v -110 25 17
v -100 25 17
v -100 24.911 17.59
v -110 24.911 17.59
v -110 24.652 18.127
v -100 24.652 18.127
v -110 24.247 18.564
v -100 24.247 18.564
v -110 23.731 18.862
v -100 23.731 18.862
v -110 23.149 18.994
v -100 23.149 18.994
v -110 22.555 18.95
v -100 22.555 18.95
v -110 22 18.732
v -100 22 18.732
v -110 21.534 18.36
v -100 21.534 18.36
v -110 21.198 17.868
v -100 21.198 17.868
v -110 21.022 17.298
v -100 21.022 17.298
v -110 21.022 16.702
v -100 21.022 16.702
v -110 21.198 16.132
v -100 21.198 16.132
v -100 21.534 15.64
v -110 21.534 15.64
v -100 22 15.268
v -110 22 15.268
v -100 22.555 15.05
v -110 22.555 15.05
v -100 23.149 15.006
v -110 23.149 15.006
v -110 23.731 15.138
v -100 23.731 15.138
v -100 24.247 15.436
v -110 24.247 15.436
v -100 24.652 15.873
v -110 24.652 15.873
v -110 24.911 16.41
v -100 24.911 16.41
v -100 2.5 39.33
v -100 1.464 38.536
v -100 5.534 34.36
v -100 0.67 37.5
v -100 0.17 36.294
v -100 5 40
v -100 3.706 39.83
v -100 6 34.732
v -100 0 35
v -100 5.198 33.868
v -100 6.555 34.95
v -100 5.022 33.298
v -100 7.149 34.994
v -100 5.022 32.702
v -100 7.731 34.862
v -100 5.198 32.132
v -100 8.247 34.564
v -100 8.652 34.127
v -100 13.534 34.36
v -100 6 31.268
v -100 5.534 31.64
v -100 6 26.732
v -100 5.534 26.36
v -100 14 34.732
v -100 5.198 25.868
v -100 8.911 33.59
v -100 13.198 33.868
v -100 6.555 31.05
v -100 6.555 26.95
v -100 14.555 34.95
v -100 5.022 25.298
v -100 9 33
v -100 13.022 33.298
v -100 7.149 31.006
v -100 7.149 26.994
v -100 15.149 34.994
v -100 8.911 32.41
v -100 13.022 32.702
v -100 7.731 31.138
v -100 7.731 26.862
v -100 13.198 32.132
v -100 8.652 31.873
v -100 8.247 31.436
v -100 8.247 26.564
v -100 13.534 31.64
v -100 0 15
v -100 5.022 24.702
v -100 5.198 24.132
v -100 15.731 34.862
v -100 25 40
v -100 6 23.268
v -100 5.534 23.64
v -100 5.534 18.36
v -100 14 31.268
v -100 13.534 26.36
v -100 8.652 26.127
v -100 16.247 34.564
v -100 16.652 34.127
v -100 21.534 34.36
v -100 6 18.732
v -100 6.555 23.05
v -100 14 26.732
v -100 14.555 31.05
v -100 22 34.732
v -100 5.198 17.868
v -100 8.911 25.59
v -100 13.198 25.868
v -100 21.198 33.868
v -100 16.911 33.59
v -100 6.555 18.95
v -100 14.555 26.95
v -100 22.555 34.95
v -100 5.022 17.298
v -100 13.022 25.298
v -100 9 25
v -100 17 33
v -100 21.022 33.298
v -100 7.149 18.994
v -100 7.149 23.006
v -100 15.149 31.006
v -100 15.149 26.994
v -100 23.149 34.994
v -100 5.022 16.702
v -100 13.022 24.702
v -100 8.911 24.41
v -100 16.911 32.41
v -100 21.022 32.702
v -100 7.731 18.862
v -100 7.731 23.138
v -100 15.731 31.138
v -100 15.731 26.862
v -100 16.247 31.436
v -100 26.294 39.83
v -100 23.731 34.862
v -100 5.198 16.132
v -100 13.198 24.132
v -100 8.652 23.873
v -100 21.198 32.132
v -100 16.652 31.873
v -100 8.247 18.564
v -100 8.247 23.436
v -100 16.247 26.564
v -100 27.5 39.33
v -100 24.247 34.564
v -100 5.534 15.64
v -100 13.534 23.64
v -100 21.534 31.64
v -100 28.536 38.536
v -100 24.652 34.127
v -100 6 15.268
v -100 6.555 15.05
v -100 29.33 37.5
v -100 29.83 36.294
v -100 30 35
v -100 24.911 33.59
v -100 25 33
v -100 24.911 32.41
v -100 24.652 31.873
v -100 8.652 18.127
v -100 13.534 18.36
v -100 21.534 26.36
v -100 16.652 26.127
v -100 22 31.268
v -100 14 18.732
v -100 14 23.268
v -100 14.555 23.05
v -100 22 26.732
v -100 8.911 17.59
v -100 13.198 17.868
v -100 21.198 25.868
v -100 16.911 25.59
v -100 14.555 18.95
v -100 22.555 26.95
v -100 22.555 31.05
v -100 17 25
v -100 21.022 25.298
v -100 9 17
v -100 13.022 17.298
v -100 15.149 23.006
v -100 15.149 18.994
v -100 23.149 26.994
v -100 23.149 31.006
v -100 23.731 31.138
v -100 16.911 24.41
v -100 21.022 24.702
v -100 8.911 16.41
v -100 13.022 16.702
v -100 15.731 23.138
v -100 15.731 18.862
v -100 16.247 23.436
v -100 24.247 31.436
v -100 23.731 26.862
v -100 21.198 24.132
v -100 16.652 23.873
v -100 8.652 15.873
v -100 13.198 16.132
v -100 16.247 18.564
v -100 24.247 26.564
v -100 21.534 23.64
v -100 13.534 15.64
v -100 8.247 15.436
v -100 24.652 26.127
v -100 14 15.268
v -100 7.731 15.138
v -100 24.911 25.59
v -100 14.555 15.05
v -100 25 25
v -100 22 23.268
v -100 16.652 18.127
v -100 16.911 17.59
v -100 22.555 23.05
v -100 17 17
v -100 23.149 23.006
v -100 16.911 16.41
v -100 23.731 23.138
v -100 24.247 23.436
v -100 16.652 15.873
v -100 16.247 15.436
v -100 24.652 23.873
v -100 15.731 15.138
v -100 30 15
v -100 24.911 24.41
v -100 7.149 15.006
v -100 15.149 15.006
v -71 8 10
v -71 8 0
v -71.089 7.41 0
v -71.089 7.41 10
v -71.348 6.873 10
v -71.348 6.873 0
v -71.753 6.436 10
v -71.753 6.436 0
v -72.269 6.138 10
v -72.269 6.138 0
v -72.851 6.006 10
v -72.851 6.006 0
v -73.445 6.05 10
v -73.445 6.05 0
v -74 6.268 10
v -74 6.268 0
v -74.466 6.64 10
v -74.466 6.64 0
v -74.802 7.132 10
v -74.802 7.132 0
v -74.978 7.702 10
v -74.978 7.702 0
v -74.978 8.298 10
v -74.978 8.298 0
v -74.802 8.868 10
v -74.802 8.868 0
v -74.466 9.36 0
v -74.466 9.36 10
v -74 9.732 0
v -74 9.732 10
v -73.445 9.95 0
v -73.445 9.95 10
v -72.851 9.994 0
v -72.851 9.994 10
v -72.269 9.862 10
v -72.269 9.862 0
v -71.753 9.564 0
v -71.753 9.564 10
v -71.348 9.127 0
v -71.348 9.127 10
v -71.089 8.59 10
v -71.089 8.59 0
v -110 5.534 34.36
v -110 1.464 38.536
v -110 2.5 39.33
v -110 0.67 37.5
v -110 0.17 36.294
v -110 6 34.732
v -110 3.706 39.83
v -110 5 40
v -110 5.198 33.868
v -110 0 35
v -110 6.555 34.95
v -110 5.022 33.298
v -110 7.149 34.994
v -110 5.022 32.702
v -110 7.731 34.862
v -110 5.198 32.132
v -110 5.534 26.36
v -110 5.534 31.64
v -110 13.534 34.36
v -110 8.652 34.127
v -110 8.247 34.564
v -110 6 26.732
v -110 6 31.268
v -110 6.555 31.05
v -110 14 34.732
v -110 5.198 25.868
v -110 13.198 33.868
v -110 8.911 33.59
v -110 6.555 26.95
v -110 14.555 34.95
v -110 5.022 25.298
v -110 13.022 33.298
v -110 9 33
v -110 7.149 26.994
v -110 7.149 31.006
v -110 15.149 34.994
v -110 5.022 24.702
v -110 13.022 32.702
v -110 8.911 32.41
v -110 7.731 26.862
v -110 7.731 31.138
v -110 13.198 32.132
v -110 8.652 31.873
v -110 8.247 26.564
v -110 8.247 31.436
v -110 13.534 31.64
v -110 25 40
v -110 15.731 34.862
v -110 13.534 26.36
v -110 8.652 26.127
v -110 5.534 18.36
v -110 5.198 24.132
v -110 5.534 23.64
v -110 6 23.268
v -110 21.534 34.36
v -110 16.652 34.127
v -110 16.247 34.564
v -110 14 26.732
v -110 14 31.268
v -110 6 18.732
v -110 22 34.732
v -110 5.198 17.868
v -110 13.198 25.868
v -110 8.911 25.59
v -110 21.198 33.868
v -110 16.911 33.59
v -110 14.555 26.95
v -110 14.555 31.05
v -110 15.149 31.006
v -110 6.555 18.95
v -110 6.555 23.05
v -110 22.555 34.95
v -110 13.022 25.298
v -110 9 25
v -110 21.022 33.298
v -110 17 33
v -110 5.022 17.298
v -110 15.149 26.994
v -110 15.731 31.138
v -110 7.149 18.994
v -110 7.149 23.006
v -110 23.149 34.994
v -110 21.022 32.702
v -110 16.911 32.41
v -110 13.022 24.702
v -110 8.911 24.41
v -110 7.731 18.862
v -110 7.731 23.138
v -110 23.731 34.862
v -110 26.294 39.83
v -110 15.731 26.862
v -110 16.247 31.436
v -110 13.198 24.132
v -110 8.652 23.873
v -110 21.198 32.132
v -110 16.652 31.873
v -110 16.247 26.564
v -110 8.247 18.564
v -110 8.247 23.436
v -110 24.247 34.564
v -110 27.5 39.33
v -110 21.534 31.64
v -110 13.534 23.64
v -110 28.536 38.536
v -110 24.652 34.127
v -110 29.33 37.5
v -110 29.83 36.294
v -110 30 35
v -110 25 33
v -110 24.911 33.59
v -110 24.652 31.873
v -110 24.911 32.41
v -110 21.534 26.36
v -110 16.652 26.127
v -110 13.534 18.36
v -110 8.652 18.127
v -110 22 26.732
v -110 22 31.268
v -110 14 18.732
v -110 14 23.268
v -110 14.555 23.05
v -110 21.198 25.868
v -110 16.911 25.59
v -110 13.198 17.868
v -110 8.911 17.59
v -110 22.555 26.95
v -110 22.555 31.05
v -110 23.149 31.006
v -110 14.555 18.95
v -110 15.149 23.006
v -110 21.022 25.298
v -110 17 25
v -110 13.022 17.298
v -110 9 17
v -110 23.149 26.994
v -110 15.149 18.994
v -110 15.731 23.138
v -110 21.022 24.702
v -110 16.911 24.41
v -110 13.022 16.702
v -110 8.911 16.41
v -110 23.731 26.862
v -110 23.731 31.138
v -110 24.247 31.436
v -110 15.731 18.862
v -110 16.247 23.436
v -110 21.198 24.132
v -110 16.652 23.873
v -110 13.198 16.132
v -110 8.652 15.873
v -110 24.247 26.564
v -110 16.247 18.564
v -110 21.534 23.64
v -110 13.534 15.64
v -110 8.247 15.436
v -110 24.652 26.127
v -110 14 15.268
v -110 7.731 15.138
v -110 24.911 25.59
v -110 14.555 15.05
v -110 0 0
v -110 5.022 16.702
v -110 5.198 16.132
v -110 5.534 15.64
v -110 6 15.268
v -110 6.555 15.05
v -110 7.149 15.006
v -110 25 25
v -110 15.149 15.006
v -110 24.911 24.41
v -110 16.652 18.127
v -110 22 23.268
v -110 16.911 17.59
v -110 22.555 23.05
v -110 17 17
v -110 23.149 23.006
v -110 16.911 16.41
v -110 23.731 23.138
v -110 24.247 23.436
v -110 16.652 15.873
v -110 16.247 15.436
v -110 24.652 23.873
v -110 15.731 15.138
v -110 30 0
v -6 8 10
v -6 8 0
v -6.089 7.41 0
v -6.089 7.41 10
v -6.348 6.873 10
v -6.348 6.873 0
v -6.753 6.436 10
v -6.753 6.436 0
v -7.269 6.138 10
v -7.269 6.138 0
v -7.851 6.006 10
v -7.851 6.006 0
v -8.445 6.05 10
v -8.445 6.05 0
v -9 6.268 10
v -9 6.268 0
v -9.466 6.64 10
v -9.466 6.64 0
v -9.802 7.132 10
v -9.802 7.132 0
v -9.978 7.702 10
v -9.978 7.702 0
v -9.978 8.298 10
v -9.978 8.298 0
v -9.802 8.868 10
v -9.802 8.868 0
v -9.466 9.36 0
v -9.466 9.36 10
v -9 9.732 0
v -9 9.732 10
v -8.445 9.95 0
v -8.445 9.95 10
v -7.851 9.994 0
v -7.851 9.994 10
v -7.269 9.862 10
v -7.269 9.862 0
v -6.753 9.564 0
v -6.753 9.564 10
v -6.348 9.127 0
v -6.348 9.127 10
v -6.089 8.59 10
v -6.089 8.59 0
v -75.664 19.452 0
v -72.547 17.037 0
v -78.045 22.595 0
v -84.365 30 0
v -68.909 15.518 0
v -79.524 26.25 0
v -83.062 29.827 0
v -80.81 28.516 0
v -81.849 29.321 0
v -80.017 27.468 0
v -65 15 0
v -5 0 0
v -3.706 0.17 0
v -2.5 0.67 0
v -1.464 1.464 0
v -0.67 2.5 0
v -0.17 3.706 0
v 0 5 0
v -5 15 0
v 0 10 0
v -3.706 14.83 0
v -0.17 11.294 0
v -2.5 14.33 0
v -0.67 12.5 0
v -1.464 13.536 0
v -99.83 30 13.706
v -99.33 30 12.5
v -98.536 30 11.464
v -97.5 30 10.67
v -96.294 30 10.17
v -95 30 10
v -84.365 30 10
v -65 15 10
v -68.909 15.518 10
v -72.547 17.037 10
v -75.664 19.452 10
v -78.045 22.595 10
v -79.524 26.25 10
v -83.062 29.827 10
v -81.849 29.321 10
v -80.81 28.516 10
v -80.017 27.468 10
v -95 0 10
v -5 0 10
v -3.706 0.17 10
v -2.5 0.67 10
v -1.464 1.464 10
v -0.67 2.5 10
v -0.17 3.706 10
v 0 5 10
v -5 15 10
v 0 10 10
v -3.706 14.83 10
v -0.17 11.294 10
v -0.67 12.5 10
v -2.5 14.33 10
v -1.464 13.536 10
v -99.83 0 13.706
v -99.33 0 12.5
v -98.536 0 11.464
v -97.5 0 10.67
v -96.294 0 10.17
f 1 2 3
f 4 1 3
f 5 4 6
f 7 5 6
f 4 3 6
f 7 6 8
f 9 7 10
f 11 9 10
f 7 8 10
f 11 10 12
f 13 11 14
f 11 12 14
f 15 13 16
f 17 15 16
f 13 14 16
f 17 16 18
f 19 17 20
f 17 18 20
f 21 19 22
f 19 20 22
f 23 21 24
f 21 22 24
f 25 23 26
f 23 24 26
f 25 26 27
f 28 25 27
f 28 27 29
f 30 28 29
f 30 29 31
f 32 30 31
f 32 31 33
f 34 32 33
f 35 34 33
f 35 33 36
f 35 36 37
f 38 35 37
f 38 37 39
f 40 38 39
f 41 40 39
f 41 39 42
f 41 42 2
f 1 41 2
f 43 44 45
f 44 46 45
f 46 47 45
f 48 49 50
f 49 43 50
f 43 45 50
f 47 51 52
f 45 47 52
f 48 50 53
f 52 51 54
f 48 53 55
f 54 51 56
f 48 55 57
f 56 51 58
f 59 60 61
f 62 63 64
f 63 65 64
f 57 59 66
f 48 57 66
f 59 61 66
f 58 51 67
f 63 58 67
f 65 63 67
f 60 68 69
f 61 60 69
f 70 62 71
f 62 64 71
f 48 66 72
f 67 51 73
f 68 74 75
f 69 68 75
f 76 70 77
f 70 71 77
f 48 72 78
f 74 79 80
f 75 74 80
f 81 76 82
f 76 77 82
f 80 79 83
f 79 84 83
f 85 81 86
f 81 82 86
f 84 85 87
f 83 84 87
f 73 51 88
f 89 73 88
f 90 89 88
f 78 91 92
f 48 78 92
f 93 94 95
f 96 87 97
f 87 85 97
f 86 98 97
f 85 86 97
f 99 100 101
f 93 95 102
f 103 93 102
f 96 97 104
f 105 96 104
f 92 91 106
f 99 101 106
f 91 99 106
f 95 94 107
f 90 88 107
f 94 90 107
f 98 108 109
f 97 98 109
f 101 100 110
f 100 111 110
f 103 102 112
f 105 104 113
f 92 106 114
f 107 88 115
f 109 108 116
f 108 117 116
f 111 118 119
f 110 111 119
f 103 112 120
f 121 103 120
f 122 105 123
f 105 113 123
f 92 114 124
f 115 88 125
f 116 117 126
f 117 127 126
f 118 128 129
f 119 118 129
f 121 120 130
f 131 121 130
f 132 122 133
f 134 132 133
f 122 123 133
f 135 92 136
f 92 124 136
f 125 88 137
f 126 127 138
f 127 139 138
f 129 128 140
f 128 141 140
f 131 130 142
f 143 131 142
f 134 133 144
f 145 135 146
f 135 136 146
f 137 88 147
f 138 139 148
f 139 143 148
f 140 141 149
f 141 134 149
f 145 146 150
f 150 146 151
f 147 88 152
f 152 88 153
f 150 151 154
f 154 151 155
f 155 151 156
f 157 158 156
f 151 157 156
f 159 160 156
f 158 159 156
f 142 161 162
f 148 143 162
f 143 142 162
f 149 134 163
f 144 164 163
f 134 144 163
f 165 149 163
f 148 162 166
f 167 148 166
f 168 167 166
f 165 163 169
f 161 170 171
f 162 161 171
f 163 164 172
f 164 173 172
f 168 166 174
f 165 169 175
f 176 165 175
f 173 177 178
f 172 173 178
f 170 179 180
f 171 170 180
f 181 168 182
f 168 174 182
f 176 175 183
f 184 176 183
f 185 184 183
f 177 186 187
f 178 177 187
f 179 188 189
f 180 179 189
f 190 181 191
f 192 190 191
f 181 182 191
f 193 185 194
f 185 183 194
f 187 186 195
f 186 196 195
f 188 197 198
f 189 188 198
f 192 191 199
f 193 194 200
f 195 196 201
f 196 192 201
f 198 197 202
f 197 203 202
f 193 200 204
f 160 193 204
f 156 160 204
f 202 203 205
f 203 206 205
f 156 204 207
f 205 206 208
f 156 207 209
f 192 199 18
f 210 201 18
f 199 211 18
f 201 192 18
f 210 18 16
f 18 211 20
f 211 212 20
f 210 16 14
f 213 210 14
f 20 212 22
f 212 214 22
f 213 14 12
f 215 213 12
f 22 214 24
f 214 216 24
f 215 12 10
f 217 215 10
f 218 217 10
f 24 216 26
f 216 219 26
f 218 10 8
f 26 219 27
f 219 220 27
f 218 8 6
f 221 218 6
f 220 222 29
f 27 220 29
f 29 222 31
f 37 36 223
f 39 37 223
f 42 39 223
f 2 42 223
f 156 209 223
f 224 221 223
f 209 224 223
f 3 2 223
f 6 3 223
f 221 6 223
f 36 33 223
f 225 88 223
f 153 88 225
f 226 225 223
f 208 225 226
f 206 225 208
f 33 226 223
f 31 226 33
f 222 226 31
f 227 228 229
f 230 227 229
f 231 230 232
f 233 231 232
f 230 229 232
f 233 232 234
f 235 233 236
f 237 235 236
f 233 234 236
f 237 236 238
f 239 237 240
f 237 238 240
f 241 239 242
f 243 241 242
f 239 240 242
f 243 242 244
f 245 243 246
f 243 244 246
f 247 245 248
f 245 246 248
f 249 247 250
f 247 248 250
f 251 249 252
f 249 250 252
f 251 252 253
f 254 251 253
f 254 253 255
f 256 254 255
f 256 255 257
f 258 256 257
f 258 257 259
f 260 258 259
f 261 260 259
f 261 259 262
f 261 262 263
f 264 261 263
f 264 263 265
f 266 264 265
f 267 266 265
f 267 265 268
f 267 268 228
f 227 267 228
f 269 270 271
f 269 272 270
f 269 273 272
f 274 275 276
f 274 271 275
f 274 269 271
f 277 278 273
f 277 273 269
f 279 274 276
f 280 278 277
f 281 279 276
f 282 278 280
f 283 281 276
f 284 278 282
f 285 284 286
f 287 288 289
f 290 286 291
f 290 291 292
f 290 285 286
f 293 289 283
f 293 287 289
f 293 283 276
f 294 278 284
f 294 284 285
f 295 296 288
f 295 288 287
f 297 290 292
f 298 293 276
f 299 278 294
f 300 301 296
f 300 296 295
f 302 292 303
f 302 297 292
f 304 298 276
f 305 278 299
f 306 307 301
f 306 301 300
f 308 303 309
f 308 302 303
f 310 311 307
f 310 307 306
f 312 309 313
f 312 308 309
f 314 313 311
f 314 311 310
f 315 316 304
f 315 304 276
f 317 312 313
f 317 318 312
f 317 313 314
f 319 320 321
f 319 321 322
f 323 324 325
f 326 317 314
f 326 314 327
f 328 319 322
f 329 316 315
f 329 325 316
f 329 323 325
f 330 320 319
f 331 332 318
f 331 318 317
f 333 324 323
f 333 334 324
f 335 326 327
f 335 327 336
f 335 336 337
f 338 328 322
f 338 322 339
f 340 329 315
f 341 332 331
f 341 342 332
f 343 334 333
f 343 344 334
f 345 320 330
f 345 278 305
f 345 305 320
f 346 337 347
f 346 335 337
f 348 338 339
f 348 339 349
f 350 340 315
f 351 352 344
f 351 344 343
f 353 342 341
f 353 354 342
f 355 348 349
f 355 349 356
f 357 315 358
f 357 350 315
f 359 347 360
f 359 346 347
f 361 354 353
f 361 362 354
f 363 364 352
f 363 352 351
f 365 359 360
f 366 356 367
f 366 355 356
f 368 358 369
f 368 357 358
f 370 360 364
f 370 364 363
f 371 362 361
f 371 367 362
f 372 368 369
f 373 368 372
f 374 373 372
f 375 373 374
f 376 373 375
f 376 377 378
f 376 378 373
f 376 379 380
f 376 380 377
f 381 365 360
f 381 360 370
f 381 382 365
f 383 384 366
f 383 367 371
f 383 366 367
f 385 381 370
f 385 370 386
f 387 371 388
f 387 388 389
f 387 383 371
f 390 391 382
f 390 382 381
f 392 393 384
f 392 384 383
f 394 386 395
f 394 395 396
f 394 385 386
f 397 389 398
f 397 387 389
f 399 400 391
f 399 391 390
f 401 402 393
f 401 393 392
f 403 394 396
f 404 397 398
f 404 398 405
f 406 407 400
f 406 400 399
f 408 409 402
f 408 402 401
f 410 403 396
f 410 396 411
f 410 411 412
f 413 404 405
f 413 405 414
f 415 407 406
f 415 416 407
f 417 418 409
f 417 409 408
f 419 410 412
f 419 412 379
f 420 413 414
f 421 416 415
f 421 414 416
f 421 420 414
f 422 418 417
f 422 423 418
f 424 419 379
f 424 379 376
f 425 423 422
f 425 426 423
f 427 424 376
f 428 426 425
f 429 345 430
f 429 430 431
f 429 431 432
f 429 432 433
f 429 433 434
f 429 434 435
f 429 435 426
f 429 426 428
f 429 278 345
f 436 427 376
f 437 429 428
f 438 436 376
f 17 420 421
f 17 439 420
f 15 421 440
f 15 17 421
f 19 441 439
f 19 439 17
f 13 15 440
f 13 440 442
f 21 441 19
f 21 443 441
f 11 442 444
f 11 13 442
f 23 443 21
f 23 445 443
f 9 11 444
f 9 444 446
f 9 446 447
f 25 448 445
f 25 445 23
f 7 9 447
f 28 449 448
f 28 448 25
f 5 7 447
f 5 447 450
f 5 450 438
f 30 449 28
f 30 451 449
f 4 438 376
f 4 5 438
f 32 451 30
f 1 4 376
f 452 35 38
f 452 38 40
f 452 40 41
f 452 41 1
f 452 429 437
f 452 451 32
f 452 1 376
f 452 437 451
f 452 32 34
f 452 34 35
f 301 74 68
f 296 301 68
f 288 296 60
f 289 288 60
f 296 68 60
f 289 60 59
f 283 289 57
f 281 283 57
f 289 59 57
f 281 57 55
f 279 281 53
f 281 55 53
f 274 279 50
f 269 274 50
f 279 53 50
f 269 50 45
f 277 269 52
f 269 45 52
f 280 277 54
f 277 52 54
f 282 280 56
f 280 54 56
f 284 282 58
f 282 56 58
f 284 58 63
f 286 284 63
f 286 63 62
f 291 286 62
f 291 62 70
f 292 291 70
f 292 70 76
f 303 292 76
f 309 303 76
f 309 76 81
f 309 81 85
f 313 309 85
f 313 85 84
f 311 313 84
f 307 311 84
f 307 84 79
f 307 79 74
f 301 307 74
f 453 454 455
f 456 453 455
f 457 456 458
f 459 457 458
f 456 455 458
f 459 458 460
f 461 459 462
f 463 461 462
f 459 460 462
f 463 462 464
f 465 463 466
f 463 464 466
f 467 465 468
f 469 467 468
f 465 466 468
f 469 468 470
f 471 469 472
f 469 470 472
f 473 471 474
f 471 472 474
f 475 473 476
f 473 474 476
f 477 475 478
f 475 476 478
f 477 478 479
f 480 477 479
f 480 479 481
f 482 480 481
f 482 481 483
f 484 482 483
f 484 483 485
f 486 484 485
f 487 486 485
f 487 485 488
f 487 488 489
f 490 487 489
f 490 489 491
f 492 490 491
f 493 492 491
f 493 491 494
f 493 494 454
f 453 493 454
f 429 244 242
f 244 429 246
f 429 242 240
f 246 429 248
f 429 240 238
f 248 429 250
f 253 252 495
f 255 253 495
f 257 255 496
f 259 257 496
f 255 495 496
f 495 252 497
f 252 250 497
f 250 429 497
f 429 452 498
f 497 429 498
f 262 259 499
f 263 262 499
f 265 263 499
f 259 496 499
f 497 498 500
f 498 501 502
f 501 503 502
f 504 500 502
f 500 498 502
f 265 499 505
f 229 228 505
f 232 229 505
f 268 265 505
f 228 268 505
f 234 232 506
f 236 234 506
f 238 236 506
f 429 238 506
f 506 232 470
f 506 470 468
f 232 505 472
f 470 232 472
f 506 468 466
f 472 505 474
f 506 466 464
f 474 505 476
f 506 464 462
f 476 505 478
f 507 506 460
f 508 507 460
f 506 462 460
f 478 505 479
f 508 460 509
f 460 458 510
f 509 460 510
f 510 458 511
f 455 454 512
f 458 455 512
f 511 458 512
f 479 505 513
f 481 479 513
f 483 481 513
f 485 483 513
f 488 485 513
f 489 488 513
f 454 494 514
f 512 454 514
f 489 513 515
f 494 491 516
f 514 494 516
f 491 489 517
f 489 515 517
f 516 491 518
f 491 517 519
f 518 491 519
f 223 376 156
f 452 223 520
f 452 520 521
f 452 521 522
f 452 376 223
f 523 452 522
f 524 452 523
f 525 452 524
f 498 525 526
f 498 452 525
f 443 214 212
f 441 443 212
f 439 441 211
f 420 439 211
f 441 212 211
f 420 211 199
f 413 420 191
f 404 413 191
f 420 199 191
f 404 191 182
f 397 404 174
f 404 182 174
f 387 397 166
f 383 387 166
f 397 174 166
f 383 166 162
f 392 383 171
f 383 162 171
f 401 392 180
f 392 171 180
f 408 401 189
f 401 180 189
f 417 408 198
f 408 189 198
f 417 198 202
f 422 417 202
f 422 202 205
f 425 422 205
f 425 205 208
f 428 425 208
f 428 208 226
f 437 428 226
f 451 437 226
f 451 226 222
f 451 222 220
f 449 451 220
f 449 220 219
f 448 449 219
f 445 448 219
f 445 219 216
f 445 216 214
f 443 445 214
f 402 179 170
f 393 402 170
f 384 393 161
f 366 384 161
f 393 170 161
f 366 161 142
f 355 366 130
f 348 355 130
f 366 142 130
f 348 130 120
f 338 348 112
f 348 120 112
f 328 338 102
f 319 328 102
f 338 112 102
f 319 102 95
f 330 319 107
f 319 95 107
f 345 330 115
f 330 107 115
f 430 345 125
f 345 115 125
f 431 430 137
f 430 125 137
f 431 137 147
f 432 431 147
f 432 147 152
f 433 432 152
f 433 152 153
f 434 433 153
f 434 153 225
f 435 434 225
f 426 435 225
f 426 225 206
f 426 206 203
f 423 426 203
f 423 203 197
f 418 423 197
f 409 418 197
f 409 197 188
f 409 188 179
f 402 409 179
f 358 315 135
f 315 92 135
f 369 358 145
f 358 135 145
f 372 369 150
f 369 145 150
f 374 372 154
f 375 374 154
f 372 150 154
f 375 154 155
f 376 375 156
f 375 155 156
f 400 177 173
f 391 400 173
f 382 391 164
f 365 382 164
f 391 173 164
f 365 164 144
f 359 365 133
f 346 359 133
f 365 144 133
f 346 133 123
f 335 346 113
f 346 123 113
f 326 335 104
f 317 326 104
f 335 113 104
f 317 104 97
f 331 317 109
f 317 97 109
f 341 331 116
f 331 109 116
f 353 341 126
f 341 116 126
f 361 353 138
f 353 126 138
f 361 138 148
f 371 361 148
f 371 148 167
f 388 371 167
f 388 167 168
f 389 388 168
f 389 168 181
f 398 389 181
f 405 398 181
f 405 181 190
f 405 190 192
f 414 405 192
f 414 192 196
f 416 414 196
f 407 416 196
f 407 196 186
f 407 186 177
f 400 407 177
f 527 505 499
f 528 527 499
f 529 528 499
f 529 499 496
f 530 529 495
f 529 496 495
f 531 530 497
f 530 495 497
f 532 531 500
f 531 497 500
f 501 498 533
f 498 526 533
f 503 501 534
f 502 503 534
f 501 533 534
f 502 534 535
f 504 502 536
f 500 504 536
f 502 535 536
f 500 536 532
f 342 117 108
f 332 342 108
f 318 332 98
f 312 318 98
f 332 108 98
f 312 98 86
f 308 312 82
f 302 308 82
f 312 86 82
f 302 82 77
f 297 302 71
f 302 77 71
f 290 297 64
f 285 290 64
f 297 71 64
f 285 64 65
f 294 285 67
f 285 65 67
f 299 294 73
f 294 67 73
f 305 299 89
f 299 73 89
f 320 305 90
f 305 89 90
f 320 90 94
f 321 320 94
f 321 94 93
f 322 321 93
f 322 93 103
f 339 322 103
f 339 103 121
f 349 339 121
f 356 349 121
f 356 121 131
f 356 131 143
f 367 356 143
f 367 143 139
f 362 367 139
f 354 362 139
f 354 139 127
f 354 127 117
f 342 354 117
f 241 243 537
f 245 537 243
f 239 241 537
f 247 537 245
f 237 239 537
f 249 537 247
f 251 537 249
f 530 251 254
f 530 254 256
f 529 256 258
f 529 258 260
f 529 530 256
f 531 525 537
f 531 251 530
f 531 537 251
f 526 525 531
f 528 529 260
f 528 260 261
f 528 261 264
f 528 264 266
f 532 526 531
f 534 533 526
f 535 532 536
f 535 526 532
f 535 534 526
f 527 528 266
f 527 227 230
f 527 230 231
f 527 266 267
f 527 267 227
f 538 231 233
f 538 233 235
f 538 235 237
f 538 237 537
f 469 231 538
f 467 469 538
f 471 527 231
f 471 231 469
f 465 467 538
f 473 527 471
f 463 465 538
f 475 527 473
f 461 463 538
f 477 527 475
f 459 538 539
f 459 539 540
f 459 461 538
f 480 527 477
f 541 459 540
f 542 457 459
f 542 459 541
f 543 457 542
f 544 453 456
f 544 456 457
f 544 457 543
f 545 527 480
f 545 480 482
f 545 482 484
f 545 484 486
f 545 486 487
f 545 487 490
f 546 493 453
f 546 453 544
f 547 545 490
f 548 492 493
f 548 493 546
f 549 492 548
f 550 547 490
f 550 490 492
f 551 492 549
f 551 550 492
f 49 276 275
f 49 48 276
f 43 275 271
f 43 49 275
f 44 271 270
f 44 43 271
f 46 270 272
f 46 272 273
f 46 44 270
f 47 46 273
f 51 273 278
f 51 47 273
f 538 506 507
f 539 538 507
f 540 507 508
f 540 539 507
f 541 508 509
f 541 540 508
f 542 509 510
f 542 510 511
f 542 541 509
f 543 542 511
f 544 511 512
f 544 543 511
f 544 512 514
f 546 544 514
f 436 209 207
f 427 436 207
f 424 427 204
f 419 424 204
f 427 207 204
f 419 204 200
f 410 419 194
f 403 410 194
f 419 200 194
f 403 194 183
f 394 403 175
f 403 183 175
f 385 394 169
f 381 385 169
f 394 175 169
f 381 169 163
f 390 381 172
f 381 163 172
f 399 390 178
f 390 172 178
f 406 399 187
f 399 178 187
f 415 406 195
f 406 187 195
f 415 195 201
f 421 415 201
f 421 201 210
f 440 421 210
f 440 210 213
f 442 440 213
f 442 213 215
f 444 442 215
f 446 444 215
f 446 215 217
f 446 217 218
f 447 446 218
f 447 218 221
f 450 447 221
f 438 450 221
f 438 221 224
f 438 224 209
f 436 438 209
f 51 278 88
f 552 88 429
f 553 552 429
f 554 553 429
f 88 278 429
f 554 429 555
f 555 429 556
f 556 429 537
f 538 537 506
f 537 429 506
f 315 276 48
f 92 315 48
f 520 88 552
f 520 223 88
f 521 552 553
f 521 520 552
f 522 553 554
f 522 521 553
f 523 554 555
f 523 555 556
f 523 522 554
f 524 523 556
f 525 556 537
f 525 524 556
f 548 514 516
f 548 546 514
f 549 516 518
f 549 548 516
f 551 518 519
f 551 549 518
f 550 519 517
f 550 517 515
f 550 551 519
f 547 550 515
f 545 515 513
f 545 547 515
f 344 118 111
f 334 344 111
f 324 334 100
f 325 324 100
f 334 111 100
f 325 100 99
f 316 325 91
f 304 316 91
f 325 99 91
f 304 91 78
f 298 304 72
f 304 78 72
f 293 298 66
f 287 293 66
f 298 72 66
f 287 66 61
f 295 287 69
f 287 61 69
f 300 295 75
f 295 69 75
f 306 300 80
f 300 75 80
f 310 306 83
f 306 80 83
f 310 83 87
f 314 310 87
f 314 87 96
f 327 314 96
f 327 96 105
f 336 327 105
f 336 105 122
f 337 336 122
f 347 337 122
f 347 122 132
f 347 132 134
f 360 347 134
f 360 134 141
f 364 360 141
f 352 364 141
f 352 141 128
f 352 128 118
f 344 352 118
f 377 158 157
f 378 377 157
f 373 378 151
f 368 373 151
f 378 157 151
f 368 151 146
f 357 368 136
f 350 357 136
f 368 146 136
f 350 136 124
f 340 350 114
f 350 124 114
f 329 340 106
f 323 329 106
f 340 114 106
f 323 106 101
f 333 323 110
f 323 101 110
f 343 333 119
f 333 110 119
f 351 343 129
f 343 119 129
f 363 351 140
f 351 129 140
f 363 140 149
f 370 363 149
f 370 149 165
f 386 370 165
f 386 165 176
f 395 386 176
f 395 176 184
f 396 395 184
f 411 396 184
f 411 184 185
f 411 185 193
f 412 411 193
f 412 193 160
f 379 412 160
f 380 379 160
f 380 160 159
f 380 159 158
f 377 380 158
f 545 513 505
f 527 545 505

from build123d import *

# Parameters (mm, degrees)
F0_W     = 110
F0_H     = 30
F1_DEPTH = 10
F2_R     = 2
F3_DEPTH = 25
F4_W     = 10
F4_H     = 30
F5_DEPTH = 30
F6_R     = 2
F7_DEPTH = 25
F8_R     = 4.99999


# Not quite as in the source:
# - a fillet or chamfer is up to 0.001 mm smaller than in the source, because OpenCascade refuses the exact size
# - a feature names something its author has since deleted; it is built from what else it names


with BuildPart() as f1:
    # F0 (on Top) → F1 (new body)
    with BuildSketch(Plane.XY):
        with Locations((-55, 15)):
            Rectangle(F0_W, F0_H)
    extrude(amount=F1_DEPTH)

    # F2 (on face) → F3 (cut)
    with BuildSketch(Plane(origin=(0, 0, 0), x_dir=(1, 0, 0), z_dir=(0, 0, -1))):
        with Locations((-8, -8)):
            Circle(F2_R)
        with Locations((-73, -8)):
            Circle(F2_R)
        with BuildLine():
            Line((0, -30), (0, -15))
            Line((0, -15), (-65, -15))
            ThreePointArc((-65, -15), (-75.6066017178, -19.3933982822), (-80, -30))
            Line((-80, -30), (0, -30))
        make_face()
    extrude(amount=-F3_DEPTH, mode=Mode.SUBTRACT)

    # F4 (on face) → F5 (join)
    with BuildSketch(Plane.XY.offset(10)):
        with Locations((-105, 15)):
            Rectangle(F4_W, F4_H)
    extrude(amount=F5_DEPTH)

    # F6 (on face) → F7 (cut)
    with BuildSketch(Plane.YZ.offset(-100)):
        with Locations((7, 17)):
            Circle(F6_R)
        with Locations((7, 25)):
            Circle(F6_R)
        with Locations((15, 33)):
            Circle(F6_R)
        with Locations((7, 33)):
            Circle(F6_R)
        with Locations((15, 25)):
            Circle(F6_R)
        with Locations((15, 17)):
            Circle(F6_R)
        with Locations((23, 17)):
            Circle(F6_R)
        with Locations((23, 25)):
            Circle(F6_R)
        with Locations((23, 33)):
            Circle(F6_R)
    extrude(amount=-F7_DEPTH, mode=Mode.SUBTRACT)

    # F8 (radius 5 in the source; OpenCascade refuses exactly that, so slightly less here)
    f8_edges = [f1.edges().sort_by_distance(p)[0] for p in [
        (0, 15, 5),
        (0, 0, 5),
        (-80, 30, 5),
        (-105, 30, 40),
        (-105, 0, 40),
        (-100, 15, 10),
    ]]
    fillet(f8_edges, radius=F8_R)


solid = f1.part
